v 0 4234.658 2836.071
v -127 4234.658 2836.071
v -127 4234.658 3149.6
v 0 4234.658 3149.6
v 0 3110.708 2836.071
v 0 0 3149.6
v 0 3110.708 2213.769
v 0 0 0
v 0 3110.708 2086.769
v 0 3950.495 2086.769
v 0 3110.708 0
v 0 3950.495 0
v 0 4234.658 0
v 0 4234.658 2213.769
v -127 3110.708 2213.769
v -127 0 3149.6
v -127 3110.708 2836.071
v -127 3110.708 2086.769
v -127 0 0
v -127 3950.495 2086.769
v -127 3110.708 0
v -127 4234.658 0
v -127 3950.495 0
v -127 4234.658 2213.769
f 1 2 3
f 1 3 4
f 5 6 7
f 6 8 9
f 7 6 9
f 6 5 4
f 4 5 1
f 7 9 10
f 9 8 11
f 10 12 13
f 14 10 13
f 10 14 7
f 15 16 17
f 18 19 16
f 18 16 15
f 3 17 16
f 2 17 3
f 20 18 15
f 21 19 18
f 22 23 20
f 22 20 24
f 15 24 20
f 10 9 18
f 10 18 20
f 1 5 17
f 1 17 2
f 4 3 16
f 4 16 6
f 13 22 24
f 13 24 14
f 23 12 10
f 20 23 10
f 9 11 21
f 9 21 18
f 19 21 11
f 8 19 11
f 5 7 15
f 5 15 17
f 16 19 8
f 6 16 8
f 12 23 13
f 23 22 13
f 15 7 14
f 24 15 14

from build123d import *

# Parameters (mm, degrees)
F1_W      = 10356.05752
F1_H      = 4488.65752
F1_W_2    = 10102.05752
F1_H_2    = 4234.65752
F2_DEPTH  = 3149.6
F3_W      = 839.7875
F3_H      = 2086.76875
F4_DEPTH  = 127.001
F5_W      = 1123.95
F5_H      = 457.20254
F6_DEPTH  = 127.001
F7_DEPTH  = 127
F8_DEPTH  = 139.7
F9_DEPTH  = 25.4
F10_DEPTH = 10229.05752
F0_W      = 10102.05752
F0_H      = 4234.65752
F11_DEPTH = 25.4
F12_DEPTH = 127


with BuildPart() as f2:
    # F1 (on face) → F2 (new body)
    with BuildSketch(Plane.XY):
        with Locations((5051.02876, 2117.32876)):
            Rectangle(F1_W, F1_H)
        with Locations((5051.02876, 2117.32876)):
            Rectangle(F1_W_2, F1_H_2, mode=Mode.SUBTRACT)
    extrude(amount=F2_DEPTH)

    # F3 (on face) → F4 (cut, through all)
    with BuildSketch(Plane.YZ):
        with Locations((3530.60127, 1043.384375)):
            Rectangle(F3_W, F3_H)
    extrude(amount=-F4_DEPTH, mode=Mode.SUBTRACT)

    # F5 (on face) → F6 (cut, through all)
    with BuildSketch(Plane.YZ):
        with Locations((3672.68252, 2442.37002)):
            Rectangle(F5_W, F5_H)
    extrude(amount=-F6_DEPTH, mode=Mode.SUBTRACT)

    # F7 (cut): a face of the model
    f7_faces = [f2.faces().sort_by_distance(p)[0] for p in [
        (5051.02876, -127, 1574.8),
    ]]
    extrude(f7_faces, amount=-F7_DEPTH, mode=Mode.SUBTRACT)

    # F8 (cut): a face of the model
    f8_faces = [f2.faces().sort_by_distance(p)[0] for p in [
        (-63.5, 3672.68252, 2670.97129),
    ]]
    extrude(f8_faces, amount=-F8_DEPTH, mode=Mode.SUBTRACT)

    # F9 (cut): a face of the model
    f9_faces = [f2.faces().sort_by_distance(p)[0] for p in [
        (-63.5, 3672.68252, 2810.67129),
    ]]
    extrude(f9_faces, amount=-F9_DEPTH, mode=Mode.SUBTRACT)

    # F10 (cut, through all): a face of the model
    f10_faces = [f2.faces().sort_by_distance(p)[0] for p in [
        (10229.05752, 2180.82876, 1574.8),
    ]]
    extrude(f10_faces, amount=-F10_DEPTH, mode=Mode.SUBTRACT)

    # F0 (on Top) → F11 (cut)
    with BuildSketch(Plane.XY):
        with Locations((5051.02876, 2117.32876)):
            Rectangle(F0_W, F0_H)
    extrude(amount=-F11_DEPTH, mode=Mode.SUBTRACT)

    # F12 (cut): a face of the model
    f12_faces = [f2.faces().sort_by_distance(p)[0] for p in [
        (-63.5, 4361.65752, 1574.8),
    ]]
    extrude(f12_faces, amount=-F12_DEPTH, mode=Mode.SUBTRACT)


solid = f2.part
